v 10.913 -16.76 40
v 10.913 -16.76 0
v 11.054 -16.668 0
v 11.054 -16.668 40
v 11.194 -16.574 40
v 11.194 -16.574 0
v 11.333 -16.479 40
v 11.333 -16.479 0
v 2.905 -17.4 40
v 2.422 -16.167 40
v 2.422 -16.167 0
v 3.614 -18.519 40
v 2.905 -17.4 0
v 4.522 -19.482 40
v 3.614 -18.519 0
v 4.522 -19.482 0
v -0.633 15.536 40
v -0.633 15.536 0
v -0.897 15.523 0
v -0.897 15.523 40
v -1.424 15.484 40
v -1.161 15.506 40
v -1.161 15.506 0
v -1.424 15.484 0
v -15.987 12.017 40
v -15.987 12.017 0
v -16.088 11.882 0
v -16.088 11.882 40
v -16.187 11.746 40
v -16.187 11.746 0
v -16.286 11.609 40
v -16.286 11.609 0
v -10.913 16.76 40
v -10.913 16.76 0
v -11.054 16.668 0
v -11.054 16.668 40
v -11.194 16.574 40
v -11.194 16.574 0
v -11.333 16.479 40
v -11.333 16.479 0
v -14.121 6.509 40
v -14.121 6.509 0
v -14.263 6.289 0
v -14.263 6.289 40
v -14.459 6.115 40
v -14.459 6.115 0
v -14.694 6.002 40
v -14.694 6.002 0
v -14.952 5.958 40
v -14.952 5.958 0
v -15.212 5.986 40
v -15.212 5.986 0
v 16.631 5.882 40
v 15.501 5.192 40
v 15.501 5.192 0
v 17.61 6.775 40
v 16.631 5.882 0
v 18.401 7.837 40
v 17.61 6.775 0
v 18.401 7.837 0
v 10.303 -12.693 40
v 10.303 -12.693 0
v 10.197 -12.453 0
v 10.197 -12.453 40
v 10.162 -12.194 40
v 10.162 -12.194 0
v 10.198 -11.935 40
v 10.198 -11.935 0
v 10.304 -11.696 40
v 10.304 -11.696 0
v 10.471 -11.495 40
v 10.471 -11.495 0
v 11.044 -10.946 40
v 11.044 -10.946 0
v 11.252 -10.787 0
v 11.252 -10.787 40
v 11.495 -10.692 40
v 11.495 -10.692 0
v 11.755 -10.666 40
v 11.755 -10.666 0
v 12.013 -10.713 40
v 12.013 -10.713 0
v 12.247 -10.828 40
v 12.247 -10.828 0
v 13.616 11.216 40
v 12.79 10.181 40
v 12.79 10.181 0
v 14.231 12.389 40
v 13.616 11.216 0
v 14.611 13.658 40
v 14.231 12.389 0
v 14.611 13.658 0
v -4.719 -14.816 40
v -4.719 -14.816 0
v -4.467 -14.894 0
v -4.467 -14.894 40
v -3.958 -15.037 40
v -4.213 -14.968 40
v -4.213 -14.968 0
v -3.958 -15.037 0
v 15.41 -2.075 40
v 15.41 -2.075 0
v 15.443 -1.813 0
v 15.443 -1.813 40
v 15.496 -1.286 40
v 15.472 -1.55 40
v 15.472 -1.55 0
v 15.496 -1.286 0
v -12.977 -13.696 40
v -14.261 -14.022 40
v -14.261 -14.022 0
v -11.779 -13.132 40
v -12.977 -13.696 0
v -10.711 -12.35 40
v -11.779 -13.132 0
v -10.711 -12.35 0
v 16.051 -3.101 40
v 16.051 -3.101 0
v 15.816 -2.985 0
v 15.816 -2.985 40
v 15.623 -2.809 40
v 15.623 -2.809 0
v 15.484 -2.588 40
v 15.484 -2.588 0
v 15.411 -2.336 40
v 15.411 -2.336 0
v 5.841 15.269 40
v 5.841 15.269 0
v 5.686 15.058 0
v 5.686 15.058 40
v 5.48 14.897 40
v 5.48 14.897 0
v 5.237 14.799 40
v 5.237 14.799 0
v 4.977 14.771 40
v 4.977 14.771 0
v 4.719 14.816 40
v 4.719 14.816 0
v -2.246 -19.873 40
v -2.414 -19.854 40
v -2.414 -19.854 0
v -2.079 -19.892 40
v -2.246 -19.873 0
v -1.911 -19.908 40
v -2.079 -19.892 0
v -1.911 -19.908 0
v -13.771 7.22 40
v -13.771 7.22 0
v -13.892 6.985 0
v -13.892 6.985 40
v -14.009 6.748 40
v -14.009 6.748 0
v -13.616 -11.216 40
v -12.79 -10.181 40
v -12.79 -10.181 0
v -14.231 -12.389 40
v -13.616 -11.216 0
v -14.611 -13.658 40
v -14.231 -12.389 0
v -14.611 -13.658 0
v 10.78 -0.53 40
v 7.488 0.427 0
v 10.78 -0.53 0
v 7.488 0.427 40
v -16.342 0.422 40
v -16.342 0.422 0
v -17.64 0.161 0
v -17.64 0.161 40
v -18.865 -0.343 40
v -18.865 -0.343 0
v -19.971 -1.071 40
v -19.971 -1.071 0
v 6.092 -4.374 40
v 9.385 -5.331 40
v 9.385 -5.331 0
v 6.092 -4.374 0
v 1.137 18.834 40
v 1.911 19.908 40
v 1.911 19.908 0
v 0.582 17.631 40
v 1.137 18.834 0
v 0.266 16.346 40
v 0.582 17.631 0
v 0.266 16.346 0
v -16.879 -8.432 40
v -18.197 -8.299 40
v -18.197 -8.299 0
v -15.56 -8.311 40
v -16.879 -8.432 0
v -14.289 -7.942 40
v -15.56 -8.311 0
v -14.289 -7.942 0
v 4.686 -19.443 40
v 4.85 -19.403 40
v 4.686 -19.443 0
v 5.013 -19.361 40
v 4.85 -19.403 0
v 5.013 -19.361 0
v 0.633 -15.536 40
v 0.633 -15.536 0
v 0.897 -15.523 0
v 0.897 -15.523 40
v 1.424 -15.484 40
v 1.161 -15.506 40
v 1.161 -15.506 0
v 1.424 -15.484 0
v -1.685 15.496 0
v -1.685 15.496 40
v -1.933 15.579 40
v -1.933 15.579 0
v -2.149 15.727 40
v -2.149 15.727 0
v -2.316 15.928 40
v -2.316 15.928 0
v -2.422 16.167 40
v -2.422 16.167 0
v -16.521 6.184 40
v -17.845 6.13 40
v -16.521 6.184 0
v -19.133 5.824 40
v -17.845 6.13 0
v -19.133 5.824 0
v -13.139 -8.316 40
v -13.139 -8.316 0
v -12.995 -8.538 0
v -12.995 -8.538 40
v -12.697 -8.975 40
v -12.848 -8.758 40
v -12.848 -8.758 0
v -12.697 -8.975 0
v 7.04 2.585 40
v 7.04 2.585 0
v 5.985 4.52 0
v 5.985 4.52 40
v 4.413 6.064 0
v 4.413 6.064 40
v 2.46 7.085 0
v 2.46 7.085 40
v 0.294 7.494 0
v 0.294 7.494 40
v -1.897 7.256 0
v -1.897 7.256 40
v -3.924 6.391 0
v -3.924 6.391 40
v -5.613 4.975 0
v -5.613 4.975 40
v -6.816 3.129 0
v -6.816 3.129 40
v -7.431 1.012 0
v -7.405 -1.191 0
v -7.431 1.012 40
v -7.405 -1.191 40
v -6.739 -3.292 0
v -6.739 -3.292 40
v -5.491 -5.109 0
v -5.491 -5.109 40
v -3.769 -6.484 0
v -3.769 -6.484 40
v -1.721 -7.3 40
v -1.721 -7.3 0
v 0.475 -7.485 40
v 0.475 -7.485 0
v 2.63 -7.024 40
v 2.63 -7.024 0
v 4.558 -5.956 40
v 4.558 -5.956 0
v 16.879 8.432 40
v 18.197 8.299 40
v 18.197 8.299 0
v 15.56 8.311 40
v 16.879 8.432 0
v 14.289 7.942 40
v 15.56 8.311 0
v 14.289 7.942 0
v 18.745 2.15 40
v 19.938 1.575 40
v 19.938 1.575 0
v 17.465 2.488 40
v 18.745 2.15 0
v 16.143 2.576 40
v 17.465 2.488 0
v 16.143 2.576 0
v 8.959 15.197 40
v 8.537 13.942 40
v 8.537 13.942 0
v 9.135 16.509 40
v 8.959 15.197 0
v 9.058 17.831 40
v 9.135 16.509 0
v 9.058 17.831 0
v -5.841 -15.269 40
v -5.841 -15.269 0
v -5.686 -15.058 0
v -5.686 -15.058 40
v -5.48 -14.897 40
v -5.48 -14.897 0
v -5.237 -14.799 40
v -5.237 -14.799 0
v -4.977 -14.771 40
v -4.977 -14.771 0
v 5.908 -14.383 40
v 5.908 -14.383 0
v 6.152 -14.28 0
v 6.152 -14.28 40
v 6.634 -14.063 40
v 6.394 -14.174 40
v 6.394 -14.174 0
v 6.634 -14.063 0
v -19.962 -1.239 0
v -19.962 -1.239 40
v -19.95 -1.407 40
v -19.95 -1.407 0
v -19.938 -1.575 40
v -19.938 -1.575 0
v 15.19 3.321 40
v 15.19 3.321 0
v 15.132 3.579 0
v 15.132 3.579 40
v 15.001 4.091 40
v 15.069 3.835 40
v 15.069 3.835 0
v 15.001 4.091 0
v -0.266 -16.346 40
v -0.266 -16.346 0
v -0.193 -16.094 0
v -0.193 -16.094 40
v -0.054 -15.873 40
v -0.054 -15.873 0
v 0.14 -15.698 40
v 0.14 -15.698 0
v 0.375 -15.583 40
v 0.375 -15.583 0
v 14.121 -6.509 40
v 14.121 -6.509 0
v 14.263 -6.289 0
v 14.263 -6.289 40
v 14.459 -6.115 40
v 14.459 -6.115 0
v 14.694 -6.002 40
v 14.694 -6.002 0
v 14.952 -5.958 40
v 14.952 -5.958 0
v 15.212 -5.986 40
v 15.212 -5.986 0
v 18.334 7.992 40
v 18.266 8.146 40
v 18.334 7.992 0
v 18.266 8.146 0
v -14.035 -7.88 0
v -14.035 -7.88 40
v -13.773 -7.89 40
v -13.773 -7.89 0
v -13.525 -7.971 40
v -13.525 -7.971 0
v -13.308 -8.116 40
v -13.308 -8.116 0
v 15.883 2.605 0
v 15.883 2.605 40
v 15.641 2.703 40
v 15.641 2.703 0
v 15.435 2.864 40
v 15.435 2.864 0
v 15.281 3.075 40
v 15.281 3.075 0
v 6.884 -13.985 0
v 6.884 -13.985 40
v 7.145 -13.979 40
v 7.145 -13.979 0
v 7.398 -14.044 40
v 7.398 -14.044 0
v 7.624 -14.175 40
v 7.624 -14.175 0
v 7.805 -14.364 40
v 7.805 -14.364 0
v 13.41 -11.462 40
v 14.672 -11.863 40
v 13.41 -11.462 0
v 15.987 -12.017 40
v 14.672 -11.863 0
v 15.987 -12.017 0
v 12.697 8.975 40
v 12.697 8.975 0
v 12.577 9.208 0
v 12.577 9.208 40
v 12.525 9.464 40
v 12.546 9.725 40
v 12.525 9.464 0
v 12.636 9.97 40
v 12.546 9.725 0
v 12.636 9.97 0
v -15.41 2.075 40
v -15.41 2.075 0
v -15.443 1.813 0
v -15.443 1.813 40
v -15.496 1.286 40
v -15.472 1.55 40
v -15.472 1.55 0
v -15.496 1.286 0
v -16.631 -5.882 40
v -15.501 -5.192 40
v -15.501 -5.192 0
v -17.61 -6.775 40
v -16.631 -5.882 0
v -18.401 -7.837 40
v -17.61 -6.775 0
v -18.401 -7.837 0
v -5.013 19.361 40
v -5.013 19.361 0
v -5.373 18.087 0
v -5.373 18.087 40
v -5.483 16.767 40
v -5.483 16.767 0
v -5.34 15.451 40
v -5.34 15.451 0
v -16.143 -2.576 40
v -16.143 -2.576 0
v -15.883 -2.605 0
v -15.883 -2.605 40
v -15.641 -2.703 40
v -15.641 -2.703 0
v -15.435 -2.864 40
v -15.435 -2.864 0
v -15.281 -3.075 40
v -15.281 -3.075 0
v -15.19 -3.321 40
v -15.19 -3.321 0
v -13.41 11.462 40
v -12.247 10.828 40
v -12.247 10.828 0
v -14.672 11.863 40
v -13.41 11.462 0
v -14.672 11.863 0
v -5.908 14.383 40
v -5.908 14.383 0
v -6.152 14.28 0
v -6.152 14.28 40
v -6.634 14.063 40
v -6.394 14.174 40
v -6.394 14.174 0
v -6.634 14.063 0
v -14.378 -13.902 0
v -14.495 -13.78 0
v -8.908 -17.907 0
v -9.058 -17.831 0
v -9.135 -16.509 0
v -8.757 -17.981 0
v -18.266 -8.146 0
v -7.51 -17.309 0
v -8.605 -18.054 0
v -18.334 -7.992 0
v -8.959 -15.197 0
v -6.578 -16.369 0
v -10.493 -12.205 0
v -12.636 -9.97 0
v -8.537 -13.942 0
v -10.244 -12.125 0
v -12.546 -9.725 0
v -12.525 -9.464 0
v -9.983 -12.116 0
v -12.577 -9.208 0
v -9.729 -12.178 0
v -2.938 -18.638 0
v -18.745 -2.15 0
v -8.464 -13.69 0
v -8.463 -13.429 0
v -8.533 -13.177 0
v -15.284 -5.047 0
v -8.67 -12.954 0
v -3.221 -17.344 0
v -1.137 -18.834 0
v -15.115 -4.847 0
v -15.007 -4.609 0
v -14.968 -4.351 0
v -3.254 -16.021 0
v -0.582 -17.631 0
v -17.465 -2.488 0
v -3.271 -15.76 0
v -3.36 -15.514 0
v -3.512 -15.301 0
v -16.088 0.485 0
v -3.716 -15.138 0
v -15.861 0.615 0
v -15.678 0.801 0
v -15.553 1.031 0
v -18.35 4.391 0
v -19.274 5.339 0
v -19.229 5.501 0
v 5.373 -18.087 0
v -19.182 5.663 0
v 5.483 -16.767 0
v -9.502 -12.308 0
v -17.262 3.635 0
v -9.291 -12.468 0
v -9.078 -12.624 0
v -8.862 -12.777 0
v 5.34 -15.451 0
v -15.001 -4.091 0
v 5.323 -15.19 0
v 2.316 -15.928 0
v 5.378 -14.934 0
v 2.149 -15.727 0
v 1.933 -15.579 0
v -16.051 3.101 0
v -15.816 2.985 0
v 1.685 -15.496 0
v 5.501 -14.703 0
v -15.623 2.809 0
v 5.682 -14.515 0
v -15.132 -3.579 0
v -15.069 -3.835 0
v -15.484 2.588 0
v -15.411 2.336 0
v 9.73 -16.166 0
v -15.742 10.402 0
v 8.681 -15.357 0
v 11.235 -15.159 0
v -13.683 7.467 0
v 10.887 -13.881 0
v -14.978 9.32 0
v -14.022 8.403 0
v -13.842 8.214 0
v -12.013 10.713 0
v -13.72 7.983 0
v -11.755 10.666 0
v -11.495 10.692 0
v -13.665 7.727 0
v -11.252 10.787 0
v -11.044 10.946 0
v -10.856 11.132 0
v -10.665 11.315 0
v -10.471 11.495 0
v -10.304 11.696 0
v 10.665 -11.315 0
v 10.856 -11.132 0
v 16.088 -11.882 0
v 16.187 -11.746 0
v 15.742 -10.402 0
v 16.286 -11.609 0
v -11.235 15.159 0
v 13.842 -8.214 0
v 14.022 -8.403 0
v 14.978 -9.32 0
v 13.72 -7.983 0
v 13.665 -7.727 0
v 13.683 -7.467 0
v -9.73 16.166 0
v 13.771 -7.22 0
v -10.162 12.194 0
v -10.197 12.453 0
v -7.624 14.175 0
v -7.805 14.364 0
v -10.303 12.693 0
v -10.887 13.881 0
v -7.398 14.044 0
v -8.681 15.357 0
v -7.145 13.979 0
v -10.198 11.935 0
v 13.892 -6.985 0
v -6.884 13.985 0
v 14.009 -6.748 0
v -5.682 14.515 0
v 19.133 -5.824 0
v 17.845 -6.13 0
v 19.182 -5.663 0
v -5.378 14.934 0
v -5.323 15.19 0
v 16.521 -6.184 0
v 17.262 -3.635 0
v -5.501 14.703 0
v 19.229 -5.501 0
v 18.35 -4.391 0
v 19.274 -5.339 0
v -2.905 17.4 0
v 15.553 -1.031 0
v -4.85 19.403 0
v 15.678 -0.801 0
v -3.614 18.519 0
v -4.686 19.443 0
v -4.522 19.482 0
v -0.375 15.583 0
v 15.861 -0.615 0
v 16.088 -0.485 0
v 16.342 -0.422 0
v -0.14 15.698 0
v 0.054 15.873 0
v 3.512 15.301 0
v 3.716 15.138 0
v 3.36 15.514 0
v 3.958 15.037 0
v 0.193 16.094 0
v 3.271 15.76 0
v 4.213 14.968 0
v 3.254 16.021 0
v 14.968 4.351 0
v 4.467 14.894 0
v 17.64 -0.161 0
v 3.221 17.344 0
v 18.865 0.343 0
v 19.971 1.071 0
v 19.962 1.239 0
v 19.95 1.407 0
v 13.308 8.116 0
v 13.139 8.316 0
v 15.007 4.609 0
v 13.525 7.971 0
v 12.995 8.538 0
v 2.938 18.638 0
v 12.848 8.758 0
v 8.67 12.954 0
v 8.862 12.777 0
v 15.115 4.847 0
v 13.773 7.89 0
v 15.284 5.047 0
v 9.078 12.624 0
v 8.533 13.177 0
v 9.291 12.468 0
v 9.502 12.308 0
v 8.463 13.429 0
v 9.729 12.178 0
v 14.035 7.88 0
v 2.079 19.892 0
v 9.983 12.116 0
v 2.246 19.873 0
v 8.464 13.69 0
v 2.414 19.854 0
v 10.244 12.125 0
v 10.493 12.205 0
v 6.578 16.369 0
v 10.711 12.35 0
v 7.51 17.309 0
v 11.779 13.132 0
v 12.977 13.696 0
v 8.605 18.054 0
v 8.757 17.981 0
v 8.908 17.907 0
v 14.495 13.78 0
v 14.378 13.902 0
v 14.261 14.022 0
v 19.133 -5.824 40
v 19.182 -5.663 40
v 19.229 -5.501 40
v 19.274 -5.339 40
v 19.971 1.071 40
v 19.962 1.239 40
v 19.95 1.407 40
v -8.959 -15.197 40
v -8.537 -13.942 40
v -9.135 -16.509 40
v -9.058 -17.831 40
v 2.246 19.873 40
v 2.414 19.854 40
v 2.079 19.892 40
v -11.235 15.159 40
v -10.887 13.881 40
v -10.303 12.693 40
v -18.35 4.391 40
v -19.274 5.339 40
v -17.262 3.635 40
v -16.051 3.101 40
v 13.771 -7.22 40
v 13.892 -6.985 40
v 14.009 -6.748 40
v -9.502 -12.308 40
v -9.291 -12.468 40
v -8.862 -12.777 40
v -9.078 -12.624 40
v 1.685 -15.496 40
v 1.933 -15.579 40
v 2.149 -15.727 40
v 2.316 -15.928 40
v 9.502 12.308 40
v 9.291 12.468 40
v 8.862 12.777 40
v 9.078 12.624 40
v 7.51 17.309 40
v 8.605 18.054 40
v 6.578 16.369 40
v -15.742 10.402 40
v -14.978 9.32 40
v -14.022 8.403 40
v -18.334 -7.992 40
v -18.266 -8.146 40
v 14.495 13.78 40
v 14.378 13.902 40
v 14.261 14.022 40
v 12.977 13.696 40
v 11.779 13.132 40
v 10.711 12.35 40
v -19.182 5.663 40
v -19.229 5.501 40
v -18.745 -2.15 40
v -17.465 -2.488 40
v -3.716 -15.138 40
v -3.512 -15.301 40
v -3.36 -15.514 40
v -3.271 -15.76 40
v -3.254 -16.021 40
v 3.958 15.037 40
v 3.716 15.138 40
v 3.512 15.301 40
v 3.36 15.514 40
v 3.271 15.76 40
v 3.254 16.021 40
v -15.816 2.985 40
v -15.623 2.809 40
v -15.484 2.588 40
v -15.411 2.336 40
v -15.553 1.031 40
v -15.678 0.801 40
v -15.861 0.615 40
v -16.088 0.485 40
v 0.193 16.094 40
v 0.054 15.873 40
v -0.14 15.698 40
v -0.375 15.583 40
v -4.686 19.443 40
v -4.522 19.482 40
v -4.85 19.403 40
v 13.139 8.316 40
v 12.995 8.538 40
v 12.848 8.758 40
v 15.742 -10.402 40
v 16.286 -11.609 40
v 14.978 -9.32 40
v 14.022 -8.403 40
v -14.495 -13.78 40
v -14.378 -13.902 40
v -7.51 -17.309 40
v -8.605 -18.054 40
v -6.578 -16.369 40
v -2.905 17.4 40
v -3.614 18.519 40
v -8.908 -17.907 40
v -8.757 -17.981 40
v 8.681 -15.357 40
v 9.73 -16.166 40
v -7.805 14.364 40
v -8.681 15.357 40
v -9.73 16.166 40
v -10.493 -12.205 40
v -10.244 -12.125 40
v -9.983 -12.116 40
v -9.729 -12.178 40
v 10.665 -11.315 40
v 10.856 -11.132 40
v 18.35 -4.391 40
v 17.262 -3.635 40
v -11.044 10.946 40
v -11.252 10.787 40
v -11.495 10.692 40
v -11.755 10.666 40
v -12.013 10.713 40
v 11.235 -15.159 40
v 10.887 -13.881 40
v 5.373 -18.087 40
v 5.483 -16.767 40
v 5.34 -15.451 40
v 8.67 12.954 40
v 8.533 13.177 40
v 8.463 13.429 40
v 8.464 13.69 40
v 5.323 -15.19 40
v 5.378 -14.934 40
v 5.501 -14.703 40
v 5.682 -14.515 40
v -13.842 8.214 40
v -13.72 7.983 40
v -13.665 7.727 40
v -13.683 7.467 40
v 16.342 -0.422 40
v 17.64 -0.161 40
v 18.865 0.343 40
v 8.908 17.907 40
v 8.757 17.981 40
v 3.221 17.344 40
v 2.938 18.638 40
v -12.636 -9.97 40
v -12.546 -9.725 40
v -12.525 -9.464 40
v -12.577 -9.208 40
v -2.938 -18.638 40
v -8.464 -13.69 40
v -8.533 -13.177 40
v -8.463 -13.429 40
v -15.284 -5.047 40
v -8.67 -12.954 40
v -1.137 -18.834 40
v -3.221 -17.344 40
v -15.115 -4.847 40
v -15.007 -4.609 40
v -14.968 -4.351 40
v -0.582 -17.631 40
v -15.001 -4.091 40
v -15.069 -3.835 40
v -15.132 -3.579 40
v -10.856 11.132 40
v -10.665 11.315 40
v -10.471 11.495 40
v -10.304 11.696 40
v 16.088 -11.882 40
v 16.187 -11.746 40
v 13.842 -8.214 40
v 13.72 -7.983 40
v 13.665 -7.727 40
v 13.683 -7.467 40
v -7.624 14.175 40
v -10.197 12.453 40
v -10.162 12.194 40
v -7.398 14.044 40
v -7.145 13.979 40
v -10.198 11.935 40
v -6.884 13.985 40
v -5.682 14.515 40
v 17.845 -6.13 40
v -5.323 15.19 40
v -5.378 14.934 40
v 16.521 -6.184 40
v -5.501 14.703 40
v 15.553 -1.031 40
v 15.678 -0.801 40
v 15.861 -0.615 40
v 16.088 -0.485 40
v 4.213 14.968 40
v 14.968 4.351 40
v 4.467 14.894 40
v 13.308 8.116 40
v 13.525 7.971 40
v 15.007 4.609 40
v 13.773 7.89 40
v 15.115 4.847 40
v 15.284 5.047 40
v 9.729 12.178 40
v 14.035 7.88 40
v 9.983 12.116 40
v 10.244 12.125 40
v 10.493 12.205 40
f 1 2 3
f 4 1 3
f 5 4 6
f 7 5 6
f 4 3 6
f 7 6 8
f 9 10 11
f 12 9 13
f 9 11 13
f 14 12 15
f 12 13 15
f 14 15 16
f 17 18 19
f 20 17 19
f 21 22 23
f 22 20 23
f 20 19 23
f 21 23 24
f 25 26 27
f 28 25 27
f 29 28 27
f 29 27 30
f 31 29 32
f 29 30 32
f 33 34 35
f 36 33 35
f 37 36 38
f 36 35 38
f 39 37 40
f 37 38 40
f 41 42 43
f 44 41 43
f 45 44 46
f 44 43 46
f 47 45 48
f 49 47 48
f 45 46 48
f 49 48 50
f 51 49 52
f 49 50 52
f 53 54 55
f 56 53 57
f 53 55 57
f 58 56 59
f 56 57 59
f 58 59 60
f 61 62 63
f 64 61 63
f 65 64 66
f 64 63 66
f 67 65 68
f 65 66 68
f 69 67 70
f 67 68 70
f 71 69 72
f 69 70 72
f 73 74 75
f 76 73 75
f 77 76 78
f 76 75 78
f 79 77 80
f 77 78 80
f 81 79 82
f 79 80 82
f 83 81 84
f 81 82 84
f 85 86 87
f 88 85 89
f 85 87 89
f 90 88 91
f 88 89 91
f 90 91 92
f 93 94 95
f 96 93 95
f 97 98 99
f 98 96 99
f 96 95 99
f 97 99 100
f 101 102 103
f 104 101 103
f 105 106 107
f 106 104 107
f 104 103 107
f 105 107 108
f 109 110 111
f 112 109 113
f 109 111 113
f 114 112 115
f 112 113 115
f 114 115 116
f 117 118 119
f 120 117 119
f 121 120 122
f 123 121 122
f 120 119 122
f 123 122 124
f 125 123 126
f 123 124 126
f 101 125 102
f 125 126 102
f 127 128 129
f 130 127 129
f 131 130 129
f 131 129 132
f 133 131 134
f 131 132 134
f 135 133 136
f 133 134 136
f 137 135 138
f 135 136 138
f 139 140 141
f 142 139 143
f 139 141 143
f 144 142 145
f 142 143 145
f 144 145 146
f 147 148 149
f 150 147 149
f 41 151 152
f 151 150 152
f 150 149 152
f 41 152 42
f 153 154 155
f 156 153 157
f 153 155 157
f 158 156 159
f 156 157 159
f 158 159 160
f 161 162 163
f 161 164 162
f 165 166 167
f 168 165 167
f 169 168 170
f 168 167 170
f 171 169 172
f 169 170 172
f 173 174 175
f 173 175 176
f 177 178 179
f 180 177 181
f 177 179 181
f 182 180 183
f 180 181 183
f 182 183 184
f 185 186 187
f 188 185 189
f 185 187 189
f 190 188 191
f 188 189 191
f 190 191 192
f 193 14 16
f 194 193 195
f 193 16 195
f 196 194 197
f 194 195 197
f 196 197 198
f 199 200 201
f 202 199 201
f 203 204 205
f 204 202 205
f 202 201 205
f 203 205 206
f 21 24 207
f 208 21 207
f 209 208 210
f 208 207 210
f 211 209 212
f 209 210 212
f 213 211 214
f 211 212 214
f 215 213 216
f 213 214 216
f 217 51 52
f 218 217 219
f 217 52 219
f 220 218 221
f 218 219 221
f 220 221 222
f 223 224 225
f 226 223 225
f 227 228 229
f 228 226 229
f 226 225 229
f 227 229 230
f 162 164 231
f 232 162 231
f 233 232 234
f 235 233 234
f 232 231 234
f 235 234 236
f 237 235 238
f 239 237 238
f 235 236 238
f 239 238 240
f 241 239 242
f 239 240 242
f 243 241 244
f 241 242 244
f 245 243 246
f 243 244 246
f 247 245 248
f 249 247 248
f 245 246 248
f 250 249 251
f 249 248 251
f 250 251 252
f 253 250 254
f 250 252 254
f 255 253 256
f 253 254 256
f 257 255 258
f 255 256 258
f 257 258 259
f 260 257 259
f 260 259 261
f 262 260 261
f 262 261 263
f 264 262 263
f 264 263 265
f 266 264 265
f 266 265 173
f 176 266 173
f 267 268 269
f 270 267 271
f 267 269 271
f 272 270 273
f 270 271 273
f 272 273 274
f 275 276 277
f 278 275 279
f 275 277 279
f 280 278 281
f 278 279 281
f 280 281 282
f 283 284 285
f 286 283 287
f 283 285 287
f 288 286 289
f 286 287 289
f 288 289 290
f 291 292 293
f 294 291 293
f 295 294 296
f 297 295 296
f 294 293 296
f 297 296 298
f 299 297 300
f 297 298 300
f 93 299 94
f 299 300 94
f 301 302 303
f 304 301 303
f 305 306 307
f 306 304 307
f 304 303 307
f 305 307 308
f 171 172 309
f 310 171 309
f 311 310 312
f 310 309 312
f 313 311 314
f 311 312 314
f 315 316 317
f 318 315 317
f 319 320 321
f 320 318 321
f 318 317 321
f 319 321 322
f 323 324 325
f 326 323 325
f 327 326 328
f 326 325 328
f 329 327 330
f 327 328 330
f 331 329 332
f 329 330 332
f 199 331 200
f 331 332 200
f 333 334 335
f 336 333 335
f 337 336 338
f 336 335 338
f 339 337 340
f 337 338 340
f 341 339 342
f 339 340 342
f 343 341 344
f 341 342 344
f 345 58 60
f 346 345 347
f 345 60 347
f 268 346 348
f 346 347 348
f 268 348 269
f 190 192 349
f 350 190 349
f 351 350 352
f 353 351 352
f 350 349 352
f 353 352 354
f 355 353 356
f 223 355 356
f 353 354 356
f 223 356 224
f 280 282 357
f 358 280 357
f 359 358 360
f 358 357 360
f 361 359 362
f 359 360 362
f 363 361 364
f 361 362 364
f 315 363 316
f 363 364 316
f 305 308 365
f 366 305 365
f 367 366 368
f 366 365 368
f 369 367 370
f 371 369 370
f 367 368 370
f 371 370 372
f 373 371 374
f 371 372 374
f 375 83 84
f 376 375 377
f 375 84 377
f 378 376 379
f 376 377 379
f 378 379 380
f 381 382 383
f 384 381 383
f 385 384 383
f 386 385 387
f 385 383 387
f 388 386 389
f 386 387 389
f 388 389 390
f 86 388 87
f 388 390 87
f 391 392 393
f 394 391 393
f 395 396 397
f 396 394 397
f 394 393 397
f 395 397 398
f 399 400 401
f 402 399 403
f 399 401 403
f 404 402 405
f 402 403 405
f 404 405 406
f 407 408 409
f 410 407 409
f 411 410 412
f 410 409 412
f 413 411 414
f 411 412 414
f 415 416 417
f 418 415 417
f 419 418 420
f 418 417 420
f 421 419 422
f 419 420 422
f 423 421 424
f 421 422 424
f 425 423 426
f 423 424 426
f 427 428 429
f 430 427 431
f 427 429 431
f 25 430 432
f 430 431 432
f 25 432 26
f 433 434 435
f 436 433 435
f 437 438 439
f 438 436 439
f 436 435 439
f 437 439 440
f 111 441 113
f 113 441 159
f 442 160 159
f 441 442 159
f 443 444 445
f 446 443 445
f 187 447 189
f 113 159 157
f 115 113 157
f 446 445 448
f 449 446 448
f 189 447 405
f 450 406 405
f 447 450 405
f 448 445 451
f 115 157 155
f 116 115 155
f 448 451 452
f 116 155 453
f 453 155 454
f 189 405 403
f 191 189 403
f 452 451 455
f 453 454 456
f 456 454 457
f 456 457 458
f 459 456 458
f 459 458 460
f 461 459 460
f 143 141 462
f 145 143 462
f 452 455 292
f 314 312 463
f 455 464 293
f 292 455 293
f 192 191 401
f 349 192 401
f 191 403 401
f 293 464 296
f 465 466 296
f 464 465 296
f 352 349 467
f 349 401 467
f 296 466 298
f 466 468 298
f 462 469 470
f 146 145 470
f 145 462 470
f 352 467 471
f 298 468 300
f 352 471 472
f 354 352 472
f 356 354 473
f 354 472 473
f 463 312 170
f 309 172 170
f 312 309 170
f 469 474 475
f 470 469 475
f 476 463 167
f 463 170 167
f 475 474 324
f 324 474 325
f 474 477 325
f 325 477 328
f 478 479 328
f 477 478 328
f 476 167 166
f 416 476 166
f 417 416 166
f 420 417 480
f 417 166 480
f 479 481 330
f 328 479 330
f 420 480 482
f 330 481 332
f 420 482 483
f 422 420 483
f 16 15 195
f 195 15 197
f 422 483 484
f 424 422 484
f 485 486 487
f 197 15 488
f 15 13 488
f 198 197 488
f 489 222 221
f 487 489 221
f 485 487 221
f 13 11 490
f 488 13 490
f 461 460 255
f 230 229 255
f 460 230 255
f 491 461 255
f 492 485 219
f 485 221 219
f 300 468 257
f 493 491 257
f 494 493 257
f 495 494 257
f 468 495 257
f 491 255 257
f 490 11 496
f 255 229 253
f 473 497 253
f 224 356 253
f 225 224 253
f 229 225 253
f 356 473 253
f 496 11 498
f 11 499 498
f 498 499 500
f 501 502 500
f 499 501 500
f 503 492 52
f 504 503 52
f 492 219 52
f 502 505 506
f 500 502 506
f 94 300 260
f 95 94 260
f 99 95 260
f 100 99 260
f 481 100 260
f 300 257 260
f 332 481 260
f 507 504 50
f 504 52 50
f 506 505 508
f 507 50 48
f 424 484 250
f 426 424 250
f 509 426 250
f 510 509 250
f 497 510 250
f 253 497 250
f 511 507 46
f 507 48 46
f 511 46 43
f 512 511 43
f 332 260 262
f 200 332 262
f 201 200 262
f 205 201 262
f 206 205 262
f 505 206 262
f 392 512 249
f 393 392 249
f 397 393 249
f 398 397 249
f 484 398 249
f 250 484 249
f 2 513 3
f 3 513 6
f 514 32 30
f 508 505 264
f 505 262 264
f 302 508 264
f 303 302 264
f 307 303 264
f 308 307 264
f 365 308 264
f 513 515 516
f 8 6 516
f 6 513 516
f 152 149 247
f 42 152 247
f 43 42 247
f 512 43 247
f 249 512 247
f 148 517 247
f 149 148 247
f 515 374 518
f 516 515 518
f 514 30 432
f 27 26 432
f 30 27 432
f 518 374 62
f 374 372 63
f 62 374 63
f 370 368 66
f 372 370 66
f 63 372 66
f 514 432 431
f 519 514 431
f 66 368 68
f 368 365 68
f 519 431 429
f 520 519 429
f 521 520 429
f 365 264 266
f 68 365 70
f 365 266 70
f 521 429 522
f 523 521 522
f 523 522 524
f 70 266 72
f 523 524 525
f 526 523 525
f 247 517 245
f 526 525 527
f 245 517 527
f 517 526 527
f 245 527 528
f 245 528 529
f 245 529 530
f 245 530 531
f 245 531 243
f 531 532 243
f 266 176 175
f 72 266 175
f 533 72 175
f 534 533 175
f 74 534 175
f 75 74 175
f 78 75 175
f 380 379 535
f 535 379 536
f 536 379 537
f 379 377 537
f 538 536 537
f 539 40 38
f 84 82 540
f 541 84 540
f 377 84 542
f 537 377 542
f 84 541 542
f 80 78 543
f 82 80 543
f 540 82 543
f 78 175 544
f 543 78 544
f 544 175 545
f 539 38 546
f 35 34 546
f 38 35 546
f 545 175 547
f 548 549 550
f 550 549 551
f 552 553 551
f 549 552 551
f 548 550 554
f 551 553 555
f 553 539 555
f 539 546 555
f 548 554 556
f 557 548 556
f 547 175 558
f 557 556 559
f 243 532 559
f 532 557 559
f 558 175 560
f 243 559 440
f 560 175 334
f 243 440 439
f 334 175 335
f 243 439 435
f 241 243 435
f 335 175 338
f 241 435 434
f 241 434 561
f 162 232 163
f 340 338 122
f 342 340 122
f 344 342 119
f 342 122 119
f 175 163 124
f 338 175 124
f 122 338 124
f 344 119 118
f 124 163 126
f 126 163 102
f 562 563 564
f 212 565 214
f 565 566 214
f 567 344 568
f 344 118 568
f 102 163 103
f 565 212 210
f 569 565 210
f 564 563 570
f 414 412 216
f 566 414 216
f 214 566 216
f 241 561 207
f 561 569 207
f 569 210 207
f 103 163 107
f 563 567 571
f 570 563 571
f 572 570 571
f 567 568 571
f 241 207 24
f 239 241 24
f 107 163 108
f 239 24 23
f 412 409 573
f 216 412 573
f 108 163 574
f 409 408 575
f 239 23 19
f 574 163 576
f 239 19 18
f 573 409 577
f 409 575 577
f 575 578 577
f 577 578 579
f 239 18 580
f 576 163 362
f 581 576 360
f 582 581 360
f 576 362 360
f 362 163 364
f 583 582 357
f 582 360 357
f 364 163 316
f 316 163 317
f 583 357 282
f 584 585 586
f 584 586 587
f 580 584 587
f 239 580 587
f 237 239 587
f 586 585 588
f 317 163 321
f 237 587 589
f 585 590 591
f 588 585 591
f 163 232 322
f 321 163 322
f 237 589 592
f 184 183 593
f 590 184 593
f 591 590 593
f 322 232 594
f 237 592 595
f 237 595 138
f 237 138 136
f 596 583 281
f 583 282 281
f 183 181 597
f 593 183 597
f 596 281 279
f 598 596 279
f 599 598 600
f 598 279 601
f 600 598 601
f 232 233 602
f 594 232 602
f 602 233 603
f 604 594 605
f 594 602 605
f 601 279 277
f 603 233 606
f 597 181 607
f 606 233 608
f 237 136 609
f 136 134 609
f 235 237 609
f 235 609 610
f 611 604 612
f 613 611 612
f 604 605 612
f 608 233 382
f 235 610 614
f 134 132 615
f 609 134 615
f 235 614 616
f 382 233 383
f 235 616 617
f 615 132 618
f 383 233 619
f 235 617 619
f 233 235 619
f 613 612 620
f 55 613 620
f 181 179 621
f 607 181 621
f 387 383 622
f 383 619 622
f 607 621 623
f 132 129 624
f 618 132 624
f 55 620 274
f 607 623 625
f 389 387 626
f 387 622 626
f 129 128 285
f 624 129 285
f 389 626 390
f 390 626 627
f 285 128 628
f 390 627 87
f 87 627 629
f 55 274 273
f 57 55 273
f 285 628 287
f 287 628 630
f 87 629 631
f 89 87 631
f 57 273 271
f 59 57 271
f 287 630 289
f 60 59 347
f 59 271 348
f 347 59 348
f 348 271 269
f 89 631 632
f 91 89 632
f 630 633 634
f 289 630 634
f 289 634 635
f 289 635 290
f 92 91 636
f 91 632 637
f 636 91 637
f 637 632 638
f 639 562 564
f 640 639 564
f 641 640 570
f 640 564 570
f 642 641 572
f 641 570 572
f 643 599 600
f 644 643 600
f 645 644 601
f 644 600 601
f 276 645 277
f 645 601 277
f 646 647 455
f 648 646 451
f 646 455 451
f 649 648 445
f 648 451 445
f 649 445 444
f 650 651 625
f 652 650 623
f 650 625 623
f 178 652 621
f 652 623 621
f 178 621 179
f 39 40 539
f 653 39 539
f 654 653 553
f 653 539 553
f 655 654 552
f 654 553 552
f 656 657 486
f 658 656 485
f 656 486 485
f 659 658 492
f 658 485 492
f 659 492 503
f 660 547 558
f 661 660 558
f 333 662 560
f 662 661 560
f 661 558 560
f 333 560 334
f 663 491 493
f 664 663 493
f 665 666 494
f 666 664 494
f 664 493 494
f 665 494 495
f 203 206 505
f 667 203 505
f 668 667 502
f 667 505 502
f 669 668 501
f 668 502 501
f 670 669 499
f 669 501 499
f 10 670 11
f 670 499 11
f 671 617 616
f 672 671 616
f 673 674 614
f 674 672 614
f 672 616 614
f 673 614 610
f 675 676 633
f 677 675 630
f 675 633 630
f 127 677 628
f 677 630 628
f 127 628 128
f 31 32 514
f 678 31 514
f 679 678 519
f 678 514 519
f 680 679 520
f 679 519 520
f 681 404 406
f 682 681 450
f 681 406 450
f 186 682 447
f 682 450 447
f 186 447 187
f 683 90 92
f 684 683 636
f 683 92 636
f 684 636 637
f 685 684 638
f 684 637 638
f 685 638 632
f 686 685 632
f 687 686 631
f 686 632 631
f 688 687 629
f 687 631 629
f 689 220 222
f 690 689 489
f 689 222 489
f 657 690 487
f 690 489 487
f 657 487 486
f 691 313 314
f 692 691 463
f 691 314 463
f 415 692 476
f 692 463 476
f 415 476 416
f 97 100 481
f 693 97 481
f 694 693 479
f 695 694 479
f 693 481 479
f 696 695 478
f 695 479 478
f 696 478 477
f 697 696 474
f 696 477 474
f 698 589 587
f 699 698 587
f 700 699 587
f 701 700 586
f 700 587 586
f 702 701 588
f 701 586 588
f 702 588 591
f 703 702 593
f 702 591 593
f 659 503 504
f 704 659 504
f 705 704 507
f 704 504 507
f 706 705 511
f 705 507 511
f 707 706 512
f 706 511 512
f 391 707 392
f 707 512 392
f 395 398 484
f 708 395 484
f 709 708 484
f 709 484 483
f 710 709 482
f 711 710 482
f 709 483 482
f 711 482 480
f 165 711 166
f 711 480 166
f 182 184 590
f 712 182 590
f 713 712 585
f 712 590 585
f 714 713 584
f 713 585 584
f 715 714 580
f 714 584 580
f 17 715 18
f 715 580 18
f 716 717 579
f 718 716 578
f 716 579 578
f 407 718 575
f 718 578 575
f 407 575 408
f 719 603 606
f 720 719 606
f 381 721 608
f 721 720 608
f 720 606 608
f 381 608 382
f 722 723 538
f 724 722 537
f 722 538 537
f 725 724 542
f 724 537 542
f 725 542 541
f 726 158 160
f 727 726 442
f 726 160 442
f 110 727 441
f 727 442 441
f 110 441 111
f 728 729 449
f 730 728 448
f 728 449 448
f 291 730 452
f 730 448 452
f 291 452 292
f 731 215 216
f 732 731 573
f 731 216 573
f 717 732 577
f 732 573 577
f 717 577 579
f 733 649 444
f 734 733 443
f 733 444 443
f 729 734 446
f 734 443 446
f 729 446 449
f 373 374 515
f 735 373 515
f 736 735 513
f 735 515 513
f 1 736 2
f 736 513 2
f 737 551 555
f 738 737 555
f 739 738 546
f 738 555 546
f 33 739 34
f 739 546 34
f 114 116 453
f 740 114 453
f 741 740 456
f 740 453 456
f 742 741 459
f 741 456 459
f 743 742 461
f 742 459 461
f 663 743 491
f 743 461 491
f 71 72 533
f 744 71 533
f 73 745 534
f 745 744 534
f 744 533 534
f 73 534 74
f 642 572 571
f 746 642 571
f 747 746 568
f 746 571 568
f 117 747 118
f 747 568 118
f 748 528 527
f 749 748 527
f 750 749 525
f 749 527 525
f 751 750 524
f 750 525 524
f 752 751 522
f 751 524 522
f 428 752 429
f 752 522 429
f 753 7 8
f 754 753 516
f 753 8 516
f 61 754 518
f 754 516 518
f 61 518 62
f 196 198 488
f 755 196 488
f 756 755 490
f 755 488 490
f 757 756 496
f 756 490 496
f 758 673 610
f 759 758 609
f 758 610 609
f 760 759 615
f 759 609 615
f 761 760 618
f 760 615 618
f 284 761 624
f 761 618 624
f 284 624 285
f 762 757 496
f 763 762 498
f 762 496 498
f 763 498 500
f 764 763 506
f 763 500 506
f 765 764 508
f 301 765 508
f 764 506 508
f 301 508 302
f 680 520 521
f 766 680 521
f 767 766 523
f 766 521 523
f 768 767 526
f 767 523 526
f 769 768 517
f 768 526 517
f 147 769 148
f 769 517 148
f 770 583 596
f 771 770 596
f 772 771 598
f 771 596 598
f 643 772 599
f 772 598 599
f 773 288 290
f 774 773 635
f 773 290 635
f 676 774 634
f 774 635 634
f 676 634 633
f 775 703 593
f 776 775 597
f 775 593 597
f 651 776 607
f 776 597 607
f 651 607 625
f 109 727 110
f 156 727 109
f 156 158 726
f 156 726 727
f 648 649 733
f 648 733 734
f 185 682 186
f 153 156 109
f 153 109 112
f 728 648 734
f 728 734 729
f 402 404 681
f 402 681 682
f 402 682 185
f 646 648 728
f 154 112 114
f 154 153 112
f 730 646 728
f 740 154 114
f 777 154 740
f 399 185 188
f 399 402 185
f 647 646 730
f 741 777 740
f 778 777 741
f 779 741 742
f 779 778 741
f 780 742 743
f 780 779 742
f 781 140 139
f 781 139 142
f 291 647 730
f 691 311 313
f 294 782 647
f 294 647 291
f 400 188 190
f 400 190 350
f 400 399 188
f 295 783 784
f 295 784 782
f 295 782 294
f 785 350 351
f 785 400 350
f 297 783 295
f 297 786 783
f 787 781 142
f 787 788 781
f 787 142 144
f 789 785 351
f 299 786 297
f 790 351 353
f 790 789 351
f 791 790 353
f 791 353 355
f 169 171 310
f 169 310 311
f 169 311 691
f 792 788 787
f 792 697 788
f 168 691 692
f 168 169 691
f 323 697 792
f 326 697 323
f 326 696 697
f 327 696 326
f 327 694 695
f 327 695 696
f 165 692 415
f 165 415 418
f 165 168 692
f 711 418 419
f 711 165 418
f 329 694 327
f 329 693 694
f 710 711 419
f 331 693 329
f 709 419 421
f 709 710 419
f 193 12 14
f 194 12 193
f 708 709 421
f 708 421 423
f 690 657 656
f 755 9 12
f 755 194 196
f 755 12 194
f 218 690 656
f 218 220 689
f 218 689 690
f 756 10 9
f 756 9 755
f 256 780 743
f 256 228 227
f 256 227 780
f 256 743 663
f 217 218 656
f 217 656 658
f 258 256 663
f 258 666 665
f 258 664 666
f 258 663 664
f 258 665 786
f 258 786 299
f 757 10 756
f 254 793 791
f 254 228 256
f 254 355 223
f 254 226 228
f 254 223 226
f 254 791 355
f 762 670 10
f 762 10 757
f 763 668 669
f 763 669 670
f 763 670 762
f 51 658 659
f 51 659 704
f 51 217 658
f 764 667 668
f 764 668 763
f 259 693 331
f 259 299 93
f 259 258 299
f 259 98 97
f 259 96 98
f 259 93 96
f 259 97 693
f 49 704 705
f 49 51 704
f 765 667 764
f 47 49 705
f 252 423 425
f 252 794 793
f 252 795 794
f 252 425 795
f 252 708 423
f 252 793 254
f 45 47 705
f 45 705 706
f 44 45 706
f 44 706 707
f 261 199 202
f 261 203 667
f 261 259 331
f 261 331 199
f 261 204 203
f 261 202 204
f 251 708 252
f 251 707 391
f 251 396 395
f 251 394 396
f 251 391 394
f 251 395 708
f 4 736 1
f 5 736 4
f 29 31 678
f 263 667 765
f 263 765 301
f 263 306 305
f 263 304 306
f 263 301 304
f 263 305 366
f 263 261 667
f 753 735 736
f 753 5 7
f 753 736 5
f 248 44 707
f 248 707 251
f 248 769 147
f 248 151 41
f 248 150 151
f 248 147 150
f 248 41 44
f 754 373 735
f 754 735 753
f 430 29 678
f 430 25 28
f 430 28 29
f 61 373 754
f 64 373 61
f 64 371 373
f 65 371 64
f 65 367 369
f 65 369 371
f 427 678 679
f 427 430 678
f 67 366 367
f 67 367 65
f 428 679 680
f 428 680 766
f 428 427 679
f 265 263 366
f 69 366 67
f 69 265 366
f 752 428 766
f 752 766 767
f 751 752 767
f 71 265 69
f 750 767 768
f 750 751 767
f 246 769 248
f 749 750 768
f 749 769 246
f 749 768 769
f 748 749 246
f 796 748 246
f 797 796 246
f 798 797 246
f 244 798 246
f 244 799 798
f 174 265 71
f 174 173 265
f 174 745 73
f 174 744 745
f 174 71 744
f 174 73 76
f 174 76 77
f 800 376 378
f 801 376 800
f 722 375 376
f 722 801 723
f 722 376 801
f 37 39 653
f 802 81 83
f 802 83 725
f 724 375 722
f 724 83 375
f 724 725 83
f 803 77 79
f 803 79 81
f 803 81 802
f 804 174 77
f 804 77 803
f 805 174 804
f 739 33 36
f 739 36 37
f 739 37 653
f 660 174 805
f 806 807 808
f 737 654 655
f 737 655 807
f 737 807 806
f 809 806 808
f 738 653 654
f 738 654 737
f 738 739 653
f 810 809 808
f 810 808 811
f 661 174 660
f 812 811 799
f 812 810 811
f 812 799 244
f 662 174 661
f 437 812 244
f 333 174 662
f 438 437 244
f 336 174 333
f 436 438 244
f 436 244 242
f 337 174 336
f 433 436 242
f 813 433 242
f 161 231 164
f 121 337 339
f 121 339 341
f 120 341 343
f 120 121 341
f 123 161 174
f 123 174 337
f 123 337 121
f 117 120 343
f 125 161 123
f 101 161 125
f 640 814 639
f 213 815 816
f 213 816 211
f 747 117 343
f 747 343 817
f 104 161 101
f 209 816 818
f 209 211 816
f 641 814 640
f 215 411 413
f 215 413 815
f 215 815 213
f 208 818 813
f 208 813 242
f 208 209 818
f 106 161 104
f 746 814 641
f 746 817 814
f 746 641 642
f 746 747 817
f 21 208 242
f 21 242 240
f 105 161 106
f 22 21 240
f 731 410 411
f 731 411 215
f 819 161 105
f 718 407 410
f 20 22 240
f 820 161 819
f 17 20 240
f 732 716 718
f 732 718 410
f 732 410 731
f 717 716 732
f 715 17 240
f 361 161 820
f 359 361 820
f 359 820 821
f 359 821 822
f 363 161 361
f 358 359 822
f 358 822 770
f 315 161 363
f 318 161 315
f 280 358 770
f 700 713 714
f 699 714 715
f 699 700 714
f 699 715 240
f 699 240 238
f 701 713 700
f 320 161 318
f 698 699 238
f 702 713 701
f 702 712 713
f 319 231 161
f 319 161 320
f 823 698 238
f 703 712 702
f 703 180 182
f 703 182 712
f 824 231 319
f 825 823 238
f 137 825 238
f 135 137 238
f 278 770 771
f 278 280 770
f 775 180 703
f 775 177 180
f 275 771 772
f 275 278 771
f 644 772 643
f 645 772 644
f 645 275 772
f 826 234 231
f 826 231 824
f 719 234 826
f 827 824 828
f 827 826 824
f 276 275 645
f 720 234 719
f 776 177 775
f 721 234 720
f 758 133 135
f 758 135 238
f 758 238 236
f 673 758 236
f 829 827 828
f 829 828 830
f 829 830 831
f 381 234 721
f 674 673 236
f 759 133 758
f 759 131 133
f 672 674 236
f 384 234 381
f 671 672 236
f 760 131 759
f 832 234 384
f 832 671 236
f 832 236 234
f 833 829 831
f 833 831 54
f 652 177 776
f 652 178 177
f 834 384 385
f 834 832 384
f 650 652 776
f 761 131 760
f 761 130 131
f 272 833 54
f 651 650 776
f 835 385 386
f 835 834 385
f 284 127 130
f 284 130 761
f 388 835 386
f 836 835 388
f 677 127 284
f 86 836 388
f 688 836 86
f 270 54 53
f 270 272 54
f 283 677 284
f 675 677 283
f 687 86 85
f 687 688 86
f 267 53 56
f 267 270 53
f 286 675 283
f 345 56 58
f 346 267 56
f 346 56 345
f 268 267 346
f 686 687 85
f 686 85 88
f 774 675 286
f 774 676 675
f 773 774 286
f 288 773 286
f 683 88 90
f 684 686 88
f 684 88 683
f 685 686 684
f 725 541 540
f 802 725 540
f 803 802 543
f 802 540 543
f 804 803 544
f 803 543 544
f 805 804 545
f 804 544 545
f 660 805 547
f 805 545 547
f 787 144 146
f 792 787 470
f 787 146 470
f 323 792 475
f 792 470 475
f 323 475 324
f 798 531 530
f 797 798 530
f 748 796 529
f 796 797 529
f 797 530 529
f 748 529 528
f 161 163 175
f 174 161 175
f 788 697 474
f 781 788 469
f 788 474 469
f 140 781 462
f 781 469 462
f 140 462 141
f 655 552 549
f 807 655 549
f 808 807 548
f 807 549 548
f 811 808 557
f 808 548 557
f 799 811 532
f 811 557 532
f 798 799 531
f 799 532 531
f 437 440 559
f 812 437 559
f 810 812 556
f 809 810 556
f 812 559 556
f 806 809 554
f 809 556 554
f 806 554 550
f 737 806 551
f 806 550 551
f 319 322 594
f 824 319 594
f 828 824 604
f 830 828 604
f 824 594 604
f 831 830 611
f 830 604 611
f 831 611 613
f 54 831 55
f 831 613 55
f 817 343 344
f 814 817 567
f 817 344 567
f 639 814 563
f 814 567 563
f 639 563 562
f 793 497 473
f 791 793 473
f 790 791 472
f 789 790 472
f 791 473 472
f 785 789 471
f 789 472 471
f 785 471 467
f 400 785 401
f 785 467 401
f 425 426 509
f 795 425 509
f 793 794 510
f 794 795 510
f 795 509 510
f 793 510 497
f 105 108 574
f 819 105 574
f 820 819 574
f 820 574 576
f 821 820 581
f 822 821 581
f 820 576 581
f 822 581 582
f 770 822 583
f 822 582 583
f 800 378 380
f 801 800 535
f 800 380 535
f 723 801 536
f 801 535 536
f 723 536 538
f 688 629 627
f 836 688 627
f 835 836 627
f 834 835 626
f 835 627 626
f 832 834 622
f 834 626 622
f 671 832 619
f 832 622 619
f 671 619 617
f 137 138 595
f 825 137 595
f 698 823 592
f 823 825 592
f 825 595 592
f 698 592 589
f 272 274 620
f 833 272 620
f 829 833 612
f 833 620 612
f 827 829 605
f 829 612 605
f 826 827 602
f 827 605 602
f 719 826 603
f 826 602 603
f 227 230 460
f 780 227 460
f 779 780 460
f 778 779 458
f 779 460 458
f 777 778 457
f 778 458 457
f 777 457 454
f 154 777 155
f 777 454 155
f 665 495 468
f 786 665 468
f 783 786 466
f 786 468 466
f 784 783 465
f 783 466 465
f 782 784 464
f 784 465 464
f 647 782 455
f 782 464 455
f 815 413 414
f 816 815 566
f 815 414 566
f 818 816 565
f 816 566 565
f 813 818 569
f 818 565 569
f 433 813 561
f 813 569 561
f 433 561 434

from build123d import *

# Parameters (mm, degrees)
SKETCH3_R         = 20
GEARBODY_DEPTH    = 40
TOOTHCUT_DEPTH    = 49.989794856
CIRPATTERN1_COUNT = 18
BOREDIA_R         = 7.5
BORE_DEPTH        = 12700
KWY1_DEPTH        = 6350


with BuildPart() as part:
    # Sketch3 → gearBody (new body)
    with BuildSketch(Plane.XY):
        Circle(SKETCH3_R)
    extrude(amount=GEARBODY_DEPTH)

    # Sketch2 → toothCut (cut, through all)
    with BuildSketch(Plane.XY):
        with BuildLine():
            ThreePointArc((15.410131867, -2.074959393), (15.458047875, -1.681183079), (15.495903347, -1.286312602))
            ThreePointArc((15.495903347, -1.286312602), (15.763268662, -0.701752182), (16.342213115, -0.422434409))
            ThreePointArc((16.342213115, -0.422434409), (19.177928805, 0.519107216), (21.353959141, 2.566709737))
            ThreePointArc((21.353959141, 2.566709737), (21.381581374, -2.325413473), (20.302931423, -7.097220969))
            ThreePointArc((20.302931423, -7.097220969), (18.617955496, -4.629703952), (16.050944608, -3.100573739))
            ThreePointArc((16.050944608, -3.100573739), (15.545581587, -2.703329086), (15.410131867, -2.074959393))
        make_face()
    toothcut = extrude(amount=TOOTHCUT_DEPTH, mode=Mode.SUBTRACT)

    # CirPattern1: toothCut ×18 about axis
    cirpattern1_axis = Axis((0, 0, 40), (0, 0, -1))
    for i in range(1, CIRPATTERN1_COUNT):
        add(toothcut.rotate(cirpattern1_axis, i * 360 / CIRPATTERN1_COUNT), mode=Mode.SUBTRACT)

    # boreDia → bore (cut, symmetric)
    with BuildSketch(Plane.XY):
        Circle(BOREDIA_R)
    extrude(amount=BORE_DEPTH, both=True, mode=Mode.SUBTRACT)

    # kwy1sketch → kwy1 (cut, symmetric)
    with BuildSketch(Plane.XY):
        Polygon((10.780497106, -0.529983162), (9.384957794, -5.331281948), (3.383334312, -3.586857808), (0, 0), (4.778873624, 1.214440978), align=None)
    extrude(amount=KWY1_DEPTH, both=True, mode=Mode.SUBTRACT)


solid = part.part
